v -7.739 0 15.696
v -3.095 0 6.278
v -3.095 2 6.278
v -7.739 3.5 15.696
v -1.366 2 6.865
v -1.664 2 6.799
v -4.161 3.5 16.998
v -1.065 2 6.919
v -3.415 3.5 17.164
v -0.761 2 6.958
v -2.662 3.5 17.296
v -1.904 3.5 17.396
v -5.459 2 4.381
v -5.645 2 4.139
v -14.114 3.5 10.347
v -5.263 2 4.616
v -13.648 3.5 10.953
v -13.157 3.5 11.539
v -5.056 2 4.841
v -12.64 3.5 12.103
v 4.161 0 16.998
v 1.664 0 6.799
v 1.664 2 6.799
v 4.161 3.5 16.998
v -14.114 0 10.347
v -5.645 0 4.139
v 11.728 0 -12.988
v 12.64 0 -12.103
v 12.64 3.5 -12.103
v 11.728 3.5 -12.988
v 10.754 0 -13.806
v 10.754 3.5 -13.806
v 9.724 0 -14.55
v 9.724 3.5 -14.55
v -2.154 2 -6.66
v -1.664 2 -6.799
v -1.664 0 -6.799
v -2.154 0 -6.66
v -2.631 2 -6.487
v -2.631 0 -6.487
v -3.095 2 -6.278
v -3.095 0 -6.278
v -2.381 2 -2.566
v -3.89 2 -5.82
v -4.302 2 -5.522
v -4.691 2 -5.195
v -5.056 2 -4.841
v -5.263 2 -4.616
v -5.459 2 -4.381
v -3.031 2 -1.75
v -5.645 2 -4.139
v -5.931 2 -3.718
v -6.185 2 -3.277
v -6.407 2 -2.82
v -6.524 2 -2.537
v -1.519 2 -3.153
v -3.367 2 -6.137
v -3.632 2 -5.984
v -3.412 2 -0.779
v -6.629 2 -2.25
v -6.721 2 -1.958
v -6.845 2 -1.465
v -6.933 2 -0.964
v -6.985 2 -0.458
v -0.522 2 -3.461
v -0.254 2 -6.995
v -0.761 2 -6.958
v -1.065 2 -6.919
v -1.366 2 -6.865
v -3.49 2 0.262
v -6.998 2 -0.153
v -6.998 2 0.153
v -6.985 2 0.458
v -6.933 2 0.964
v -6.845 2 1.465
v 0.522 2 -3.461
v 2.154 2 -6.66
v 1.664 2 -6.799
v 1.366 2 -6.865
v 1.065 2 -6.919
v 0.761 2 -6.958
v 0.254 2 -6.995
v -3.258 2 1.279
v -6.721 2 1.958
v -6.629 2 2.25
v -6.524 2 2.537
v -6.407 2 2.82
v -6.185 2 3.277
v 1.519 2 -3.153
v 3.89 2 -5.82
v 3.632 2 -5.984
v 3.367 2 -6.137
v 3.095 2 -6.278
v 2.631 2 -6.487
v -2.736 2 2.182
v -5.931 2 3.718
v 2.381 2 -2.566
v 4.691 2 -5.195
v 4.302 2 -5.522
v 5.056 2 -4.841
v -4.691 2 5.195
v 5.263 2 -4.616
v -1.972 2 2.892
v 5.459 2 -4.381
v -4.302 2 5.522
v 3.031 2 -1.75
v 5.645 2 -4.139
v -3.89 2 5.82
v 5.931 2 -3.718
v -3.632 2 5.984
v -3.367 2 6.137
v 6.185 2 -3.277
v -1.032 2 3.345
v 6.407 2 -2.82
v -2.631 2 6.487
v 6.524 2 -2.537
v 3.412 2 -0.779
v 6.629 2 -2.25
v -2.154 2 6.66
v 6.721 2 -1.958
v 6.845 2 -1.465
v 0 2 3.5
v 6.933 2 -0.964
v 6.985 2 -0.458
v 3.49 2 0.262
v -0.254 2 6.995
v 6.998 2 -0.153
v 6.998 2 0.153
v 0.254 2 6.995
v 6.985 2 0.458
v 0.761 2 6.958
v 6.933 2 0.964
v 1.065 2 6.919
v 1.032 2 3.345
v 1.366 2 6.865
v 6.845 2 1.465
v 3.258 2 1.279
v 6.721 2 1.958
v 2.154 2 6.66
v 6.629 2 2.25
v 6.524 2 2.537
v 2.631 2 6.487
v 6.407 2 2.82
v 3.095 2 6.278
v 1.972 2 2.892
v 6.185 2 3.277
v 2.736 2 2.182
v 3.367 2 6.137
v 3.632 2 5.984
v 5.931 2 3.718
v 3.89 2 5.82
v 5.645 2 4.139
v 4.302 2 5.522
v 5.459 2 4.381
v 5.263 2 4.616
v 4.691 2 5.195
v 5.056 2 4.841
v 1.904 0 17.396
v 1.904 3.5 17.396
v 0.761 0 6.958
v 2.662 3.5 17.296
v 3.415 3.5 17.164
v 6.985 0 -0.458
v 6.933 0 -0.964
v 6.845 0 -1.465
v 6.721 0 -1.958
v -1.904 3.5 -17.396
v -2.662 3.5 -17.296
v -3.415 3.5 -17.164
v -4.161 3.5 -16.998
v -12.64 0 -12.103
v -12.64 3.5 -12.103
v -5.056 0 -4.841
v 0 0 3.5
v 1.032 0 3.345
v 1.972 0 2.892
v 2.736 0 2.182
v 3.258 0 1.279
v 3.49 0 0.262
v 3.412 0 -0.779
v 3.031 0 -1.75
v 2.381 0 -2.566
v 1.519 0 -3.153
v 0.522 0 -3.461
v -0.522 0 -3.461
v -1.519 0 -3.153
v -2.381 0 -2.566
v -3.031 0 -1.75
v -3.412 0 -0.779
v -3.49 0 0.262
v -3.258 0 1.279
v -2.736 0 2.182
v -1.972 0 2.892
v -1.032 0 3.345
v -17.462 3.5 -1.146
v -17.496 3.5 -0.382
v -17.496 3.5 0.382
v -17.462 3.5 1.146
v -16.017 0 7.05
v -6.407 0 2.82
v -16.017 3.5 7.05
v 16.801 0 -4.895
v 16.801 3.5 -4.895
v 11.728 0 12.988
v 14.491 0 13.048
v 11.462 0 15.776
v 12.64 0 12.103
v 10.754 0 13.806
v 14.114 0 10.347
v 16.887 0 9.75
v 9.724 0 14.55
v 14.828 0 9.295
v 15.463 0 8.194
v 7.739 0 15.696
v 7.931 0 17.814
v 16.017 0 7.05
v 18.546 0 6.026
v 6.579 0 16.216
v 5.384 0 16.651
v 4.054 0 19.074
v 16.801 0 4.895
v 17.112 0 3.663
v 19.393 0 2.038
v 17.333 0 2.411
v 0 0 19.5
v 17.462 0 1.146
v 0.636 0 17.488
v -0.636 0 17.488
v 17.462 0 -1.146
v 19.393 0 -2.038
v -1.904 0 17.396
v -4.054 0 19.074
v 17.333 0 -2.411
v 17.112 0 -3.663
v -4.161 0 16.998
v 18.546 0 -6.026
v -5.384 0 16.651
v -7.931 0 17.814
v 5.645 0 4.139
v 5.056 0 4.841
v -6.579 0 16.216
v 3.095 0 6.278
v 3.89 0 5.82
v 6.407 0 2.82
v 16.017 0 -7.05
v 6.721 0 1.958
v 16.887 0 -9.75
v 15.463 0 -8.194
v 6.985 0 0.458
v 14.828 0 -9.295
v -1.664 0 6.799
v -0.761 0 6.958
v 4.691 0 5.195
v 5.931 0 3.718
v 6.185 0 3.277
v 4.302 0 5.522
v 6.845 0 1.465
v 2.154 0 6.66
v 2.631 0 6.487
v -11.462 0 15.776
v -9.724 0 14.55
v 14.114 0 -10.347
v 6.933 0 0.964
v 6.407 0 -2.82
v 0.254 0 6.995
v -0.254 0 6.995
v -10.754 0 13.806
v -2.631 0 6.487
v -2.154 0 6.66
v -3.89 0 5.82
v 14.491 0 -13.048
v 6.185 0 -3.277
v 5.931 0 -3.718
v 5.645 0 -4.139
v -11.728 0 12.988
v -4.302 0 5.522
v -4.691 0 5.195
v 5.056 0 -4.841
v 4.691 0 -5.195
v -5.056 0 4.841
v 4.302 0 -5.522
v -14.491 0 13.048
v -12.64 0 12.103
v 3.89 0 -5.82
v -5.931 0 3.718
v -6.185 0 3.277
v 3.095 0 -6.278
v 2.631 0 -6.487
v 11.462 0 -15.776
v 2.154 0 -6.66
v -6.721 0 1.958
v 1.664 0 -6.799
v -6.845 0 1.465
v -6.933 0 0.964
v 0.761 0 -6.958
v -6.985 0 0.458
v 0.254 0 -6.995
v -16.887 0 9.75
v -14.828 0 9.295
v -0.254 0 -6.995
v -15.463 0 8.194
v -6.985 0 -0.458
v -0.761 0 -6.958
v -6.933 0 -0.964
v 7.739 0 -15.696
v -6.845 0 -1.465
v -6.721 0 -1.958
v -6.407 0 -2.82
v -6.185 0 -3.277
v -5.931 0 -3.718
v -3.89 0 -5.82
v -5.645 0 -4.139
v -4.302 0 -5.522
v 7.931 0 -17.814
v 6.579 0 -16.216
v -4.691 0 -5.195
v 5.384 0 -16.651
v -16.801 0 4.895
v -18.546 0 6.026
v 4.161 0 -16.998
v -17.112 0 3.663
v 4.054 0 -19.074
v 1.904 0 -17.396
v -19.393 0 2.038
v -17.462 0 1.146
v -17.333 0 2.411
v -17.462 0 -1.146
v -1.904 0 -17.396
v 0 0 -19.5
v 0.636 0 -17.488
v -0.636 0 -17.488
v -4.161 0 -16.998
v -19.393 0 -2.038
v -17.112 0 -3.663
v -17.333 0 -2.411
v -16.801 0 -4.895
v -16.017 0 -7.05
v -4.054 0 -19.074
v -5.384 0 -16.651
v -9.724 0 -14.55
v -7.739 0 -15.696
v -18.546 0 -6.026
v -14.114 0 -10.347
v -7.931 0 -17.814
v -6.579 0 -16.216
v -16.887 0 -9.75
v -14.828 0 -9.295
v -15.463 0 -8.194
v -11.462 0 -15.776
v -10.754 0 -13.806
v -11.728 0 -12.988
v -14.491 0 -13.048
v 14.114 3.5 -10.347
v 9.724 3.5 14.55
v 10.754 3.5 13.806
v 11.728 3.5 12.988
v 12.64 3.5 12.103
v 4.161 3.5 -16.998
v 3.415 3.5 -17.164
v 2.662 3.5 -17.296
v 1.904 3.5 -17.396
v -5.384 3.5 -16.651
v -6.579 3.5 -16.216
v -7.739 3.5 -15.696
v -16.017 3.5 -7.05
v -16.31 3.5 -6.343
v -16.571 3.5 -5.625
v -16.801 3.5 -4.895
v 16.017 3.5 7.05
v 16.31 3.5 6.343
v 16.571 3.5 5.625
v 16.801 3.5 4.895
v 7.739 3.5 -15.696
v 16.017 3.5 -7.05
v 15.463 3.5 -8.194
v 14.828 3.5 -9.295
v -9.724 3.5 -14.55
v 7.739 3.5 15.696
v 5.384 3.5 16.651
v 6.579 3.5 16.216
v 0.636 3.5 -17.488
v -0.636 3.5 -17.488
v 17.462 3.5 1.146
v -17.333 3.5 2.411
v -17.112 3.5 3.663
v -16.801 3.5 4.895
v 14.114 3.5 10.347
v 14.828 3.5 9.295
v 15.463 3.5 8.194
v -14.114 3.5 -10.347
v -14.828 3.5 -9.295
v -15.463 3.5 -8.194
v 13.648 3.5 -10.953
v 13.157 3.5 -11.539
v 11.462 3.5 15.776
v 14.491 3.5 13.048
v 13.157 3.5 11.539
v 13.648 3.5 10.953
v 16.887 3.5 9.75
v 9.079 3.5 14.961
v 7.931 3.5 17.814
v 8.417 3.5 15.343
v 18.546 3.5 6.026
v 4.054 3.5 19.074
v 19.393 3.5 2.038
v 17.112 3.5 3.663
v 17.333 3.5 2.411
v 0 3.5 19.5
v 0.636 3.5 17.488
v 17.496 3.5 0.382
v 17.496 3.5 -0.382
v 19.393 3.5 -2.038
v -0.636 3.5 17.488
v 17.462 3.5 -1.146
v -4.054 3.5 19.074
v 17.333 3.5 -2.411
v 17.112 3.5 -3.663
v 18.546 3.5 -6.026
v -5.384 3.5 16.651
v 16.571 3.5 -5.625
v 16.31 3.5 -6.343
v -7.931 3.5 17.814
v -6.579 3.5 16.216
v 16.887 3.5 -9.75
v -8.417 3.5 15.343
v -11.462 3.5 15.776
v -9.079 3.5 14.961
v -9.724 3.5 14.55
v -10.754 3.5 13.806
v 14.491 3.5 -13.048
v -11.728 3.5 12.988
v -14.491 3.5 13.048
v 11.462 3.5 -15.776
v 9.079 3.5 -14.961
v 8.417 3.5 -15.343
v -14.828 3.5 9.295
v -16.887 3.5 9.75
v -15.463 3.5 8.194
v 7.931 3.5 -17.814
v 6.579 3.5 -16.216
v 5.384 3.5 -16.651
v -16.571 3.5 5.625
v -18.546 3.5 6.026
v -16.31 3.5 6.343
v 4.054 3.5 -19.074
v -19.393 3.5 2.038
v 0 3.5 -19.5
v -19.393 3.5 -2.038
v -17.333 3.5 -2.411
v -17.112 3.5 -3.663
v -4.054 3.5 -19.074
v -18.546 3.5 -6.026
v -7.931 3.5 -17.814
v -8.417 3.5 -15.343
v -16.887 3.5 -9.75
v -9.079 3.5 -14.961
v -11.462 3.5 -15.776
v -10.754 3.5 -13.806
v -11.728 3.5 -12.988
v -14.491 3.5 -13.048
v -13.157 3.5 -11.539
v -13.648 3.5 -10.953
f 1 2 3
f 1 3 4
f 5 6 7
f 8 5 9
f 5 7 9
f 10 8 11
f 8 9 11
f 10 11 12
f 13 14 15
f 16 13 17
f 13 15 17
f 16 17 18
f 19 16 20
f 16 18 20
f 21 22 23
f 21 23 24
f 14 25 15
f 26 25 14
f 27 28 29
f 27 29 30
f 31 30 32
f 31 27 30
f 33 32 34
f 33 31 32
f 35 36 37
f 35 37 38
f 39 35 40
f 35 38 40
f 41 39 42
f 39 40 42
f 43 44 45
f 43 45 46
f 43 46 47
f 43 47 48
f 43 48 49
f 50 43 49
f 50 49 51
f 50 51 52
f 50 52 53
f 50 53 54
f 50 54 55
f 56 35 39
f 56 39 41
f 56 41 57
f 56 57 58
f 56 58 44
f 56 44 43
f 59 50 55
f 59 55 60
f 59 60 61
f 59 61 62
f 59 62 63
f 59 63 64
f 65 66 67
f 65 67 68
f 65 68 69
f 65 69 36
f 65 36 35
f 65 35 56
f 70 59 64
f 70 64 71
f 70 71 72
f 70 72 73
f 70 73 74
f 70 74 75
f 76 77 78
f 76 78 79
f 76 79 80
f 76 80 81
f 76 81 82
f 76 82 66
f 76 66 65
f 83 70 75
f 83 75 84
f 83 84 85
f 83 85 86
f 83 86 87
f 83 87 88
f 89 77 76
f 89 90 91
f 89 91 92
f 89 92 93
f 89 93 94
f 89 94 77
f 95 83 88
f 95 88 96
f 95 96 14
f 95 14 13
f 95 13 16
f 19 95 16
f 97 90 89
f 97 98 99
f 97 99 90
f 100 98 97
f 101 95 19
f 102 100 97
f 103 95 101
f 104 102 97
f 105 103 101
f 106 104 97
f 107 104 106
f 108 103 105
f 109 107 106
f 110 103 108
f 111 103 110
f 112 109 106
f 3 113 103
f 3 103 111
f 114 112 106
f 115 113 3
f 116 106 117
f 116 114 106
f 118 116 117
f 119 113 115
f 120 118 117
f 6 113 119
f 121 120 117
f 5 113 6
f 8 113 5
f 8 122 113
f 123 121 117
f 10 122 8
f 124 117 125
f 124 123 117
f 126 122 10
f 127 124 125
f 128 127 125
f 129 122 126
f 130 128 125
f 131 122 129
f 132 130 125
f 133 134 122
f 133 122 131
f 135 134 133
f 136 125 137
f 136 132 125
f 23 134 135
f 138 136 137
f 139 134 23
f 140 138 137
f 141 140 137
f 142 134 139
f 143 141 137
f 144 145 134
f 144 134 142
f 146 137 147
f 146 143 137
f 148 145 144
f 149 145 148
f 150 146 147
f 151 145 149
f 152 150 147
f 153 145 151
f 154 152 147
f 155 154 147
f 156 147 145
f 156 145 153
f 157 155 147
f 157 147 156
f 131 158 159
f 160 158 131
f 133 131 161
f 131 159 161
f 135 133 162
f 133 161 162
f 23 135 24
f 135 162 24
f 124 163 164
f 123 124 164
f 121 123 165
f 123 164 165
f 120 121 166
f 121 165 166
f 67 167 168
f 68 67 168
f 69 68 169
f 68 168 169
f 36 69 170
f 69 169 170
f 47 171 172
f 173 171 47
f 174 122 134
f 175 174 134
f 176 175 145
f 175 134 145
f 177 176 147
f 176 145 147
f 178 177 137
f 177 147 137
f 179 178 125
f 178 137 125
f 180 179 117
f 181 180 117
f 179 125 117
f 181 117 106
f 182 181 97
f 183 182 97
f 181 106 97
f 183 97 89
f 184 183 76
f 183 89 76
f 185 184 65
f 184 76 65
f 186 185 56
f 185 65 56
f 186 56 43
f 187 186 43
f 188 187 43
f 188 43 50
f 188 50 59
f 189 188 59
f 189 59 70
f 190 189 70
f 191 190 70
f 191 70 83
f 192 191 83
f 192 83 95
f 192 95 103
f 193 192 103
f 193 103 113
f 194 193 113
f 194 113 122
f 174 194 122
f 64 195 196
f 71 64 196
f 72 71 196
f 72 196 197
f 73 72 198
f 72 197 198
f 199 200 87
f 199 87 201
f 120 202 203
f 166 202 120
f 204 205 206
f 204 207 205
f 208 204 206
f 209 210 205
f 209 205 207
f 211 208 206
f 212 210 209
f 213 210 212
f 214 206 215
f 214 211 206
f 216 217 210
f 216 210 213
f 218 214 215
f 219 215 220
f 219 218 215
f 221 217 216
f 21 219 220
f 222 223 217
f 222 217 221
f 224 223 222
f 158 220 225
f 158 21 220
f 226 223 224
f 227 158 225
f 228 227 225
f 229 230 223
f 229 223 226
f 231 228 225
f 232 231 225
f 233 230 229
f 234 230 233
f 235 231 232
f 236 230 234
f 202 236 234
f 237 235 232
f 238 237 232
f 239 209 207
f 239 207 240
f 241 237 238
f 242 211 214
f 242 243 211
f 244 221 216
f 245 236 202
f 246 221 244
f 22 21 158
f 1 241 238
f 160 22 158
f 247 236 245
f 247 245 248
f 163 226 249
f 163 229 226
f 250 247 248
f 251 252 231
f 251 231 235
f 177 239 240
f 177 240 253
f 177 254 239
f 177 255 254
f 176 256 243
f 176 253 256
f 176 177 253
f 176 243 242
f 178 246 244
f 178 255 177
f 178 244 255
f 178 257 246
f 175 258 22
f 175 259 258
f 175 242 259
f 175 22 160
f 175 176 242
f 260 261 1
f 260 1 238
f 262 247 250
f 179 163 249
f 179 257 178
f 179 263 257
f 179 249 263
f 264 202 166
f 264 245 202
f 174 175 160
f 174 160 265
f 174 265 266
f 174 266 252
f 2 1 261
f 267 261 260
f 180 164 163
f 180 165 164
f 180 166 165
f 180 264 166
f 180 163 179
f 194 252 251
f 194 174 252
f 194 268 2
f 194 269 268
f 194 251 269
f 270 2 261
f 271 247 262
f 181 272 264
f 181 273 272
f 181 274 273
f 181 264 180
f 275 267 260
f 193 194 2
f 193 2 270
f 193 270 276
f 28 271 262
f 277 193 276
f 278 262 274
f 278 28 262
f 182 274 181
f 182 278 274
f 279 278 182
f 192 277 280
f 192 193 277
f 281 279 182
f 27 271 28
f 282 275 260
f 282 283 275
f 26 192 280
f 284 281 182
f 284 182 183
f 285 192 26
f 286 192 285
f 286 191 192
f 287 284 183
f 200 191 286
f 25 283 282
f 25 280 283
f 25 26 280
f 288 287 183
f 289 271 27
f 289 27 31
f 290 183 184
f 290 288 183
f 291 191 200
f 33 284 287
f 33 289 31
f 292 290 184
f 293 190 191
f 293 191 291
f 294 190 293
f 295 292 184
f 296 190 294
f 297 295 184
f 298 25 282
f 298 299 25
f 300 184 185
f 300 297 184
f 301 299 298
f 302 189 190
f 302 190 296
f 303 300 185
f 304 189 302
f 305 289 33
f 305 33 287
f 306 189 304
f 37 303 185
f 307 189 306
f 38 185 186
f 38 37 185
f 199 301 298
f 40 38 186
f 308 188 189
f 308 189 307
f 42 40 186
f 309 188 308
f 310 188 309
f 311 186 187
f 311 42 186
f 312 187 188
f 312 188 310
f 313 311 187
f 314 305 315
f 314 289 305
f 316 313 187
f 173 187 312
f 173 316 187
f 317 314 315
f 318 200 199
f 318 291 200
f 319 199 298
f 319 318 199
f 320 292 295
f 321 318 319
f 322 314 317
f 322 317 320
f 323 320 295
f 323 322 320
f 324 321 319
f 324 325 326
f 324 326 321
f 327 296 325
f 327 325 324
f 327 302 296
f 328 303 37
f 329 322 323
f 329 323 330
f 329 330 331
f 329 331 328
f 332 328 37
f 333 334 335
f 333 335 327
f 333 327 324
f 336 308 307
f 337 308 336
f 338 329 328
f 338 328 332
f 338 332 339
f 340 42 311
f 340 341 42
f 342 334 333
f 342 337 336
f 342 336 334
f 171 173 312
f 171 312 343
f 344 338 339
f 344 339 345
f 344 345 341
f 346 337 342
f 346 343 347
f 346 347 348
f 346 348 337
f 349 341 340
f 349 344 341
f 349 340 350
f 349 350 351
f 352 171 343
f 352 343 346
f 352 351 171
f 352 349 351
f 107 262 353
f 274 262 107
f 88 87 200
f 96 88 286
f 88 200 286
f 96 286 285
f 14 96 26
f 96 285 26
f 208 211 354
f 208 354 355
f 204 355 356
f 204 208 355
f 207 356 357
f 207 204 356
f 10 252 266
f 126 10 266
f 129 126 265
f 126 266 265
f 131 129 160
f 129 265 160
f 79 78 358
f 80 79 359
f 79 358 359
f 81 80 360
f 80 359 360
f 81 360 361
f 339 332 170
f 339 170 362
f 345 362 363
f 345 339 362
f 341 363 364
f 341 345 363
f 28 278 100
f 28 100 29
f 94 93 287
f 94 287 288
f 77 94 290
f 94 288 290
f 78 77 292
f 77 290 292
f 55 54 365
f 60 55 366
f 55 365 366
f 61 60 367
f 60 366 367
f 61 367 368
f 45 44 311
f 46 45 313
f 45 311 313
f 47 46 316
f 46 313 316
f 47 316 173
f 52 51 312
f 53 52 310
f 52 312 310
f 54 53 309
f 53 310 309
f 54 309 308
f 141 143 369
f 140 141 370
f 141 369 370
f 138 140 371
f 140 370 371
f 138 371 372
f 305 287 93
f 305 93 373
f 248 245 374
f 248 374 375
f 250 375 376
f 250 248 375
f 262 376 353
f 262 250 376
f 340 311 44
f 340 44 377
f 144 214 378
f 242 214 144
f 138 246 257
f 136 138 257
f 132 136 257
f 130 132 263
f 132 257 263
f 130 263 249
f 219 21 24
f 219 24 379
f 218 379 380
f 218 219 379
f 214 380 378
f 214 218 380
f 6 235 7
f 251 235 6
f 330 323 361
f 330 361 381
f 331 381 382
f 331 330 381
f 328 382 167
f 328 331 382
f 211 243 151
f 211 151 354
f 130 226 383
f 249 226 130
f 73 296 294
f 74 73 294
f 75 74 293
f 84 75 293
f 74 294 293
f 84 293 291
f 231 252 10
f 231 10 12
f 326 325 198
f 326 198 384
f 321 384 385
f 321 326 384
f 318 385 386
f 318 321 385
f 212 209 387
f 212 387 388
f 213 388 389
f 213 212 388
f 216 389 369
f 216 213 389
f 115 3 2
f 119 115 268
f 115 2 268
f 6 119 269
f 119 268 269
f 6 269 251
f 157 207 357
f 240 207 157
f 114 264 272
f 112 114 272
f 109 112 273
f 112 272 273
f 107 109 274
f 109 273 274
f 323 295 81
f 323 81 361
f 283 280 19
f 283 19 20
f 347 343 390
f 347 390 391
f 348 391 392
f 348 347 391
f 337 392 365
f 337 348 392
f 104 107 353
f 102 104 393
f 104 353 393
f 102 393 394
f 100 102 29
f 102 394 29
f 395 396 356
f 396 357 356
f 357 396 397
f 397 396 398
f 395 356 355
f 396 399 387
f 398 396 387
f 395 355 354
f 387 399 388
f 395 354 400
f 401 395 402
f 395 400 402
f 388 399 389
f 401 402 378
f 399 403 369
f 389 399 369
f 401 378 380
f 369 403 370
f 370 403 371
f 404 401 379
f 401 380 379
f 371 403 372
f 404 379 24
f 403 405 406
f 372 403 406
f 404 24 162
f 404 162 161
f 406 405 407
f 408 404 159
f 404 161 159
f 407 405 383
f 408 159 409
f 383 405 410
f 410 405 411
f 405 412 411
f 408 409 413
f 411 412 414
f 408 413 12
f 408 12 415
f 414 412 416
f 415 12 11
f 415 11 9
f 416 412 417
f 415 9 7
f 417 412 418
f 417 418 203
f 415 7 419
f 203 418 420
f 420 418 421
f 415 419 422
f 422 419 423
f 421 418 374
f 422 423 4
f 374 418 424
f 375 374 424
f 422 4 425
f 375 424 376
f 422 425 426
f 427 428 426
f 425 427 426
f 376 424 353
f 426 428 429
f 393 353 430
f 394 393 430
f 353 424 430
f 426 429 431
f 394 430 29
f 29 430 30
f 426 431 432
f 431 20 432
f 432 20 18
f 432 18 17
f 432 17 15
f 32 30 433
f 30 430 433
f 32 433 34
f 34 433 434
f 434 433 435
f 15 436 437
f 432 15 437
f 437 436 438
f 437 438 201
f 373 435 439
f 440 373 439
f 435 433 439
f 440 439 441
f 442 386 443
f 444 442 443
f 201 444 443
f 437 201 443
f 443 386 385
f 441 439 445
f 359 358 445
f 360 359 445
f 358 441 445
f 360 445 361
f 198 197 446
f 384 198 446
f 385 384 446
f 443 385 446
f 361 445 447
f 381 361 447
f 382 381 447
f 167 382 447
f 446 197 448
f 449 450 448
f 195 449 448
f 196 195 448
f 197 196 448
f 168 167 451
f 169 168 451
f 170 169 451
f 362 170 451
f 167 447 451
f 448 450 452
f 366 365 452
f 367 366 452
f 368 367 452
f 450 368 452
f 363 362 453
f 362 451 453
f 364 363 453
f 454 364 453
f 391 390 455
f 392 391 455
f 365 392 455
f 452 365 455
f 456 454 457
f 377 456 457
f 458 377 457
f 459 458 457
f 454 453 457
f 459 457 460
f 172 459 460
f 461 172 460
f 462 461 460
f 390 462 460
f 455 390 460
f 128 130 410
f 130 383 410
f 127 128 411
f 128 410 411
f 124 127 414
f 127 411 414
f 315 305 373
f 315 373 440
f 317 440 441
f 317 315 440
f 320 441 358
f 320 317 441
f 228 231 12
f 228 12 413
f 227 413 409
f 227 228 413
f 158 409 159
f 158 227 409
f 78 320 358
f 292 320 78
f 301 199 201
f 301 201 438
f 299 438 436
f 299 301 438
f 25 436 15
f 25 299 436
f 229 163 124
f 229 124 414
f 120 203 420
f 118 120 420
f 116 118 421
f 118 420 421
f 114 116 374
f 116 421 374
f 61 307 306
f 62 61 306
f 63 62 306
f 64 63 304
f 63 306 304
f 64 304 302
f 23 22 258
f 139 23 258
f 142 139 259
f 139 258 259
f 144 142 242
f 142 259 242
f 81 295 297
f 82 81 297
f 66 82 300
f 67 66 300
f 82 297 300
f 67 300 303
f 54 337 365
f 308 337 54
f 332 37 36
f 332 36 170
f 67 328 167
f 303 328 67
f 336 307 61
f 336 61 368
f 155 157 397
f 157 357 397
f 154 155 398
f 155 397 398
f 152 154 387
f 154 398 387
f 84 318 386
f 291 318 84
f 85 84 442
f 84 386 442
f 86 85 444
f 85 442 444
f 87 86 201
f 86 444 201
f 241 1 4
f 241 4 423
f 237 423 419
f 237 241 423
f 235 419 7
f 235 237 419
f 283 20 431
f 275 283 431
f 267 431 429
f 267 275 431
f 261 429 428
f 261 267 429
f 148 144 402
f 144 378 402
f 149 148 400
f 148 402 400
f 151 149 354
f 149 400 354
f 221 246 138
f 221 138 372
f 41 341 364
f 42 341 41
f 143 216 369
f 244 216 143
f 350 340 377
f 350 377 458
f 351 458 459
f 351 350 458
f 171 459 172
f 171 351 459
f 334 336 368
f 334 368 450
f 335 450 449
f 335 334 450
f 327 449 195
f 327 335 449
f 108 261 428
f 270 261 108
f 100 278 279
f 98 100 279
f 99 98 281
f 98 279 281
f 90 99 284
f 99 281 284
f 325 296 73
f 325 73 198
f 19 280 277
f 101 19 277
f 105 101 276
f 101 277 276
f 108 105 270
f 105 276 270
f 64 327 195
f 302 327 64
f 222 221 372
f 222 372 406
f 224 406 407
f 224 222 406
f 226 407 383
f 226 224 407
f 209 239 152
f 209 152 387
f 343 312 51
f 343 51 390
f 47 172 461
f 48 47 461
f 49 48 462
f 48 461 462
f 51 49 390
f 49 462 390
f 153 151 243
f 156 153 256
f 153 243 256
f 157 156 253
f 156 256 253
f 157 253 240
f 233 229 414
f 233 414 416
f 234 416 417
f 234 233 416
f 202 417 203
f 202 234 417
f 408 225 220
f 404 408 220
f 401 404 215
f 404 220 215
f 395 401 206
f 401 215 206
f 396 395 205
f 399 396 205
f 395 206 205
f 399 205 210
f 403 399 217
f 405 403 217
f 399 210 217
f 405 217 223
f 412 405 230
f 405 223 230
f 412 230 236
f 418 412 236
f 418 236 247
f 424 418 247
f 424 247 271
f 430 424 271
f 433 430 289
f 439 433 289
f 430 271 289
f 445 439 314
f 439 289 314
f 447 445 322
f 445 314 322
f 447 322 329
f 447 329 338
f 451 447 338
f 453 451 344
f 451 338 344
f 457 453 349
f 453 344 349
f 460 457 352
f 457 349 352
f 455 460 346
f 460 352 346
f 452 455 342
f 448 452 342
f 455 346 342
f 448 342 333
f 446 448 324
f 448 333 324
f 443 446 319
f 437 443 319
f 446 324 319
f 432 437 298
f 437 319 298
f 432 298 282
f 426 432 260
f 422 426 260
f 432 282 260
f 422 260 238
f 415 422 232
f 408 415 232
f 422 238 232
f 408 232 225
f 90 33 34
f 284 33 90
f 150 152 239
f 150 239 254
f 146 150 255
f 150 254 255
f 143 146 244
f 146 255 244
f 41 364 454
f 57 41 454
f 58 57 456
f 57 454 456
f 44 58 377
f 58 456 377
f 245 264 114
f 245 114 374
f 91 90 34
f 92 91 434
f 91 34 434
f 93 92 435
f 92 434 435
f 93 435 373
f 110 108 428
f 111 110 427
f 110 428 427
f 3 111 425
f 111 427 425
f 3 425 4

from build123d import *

# Parameters (mm, degrees)
SKETCH1_R           = 19.5
SKETCH1_R_2         = 17.5
BOSS_EXTRUDE1_DEPTH = 3.5
SKETCH2_R           = 7
BOSS_EXTRUDE2_DEPTH = 2
BOSS_EXTRUDE3_DEPTH = 3.5
SKETCH8_R           = 3.5
CUT_EXTRUDE1_DEPTH  = 28.649593125


with BuildPart() as part:
    # Sketch1 → Boss-Extrude1 (new body)
    with BuildSketch(Plane(origin=(0, 0, 0), x_dir=(1, 0, 0), z_dir=(0, 1, 0))):
        with Locations(Location((0, 0, 0), (0, 0, 270))):
            Circle(SKETCH1_R)
        with Locations(Location((0, 0, 0), (0, 0, 270))):
            Circle(SKETCH1_R_2, mode=Mode.SUBTRACT)
    extrude(amount=BOSS_EXTRUDE1_DEPTH)



with BuildPart() as body_2:
    # Sketch2 → Boss-Extrude2 (new body)
    with BuildSketch(Plane(origin=(0, 0, 0), x_dir=(1, 0, 0), z_dir=(0, 1, 0))):
        with Locations(Location((0, 0, 0), (0, 0, 270))):
            Circle(SKETCH2_R)
    extrude(amount=BOSS_EXTRUDE2_DEPTH)


with BuildPart() as part_1:
    add(part.part)

    add(body_2.part)  # Boss-Extrude3 merges body 2
    # Sketch4 → Boss-Extrude3 (add)
    with BuildSketch(Plane(origin=(0, 0, 0), x_dir=(1, 0, 0), z_dir=(0, 1, 0))):
        with BuildLine():
            Line((0.76143589, 6.958463579), (1.903589725, 17.396158948))
            ThreePointArc((1.903589725, 17.396158948), (3.038843109, 17.234135678), (4.161047559, 16.998108224))
            Line((4.161047559, 16.998108224), (1.664419024, 6.79924329))
            ThreePointArc((1.664419024, 6.79924329), (1.215537244, 6.893654271), (0.76143589, 6.958463579))
        make_face()
        with BuildLine():
            Line((3.095450398, 6.278390465), (7.738625995, 15.695976163))
            ThreePointArc((7.738625995, 15.695976163), (8.75, 15.155444566), (9.723801097, 14.549834783))
            Line((9.723801097, 14.549834783), (3.889520439, 5.819933913))
            ThreePointArc((3.889520439, 5.819933913), (3.5, 6.062177826), (3.095450398, 6.278390465))
        make_face()
        with BuildLine():
            Line((5.056107904, 4.841050802), (12.640269759, 12.102627005))
            ThreePointArc((12.640269759, 12.102627005), (13.405777755, 11.24878317), (14.113720715, 10.346636535))
            Line((14.113720715, 10.346636535), (5.645488286, 4.138654614))
            ThreePointArc((5.645488286, 4.138654614), (5.362311102, 4.499513268), (5.056107904, 4.841050802))
        make_face()
        with BuildLine():
            Line((6.406924176, 2.819808966), (16.01731044, 7.049522414))
            ThreePointArc((16.01731044, 7.049522414), (16.444620864, 5.985352508), (16.801317318, 4.89548122))
            Line((16.801317318, 4.89548122), (6.720526927, 1.958192488))
            ThreePointArc((6.720526927, 1.958192488), (6.577848346, 2.394141003), (6.406924176, 2.819808966))
        make_face()
        with BuildLine():
            Line((6.984970837, 0.458456552), (17.462427092, 1.14614138))
            ThreePointArc((17.462427092, 1.14614138), (17.5, 0), (17.462427092, -1.14614138))
            Line((17.462427092, -1.14614138), (6.984970837, -0.458456552))
            ThreePointArc((6.984970837, -0.458456552), (7, 0), (6.984970837, 0.458456552))
        make_face()
        with BuildLine():
            Line((6.720526927, -1.958192488), (16.801317318, -4.89548122))
            ThreePointArc((16.801317318, -4.89548122), (16.444620864, -5.985352508), (16.01731044, -7.049522414))
            Line((16.01731044, -7.049522414), (6.406924176, -2.819808966))
            ThreePointArc((6.406924176, -2.819808966), (6.577848346, -2.394141003), (6.720526927, -1.958192488))
        make_face()
        with BuildLine():
            Line((5.645488286, -4.138654614), (14.113720715, -10.346636535))
            ThreePointArc((14.113720715, -10.346636535), (13.405777755, -11.24878317), (12.640269759, -12.102627005))
            Line((12.640269759, -12.102627005), (5.056107904, -4.841050802))
            ThreePointArc((5.056107904, -4.841050802), (5.362311102, -4.499513268), (5.645488286, -4.138654614))
        make_face()
        with BuildLine():
            Line((3.889520439, -5.819933913), (9.723801097, -14.549834783))
            ThreePointArc((9.723801097, -14.549834783), (8.75, -15.155444566), (7.738625995, -15.695976163))
            Line((7.738625995, -15.695976163), (3.095450398, -6.278390465))
            ThreePointArc((3.095450398, -6.278390465), (3.5, -6.062177826), (3.889520439, -5.819933913))
        make_face()
        with BuildLine():
            Line((1.664419024, -6.79924329), (4.161047559, -16.998108224))
            ThreePointArc((4.161047559, -16.998108224), (3.038843109, -17.234135678), (1.903589725, -17.396158948))
            Line((1.903589725, -17.396158948), (0.76143589, -6.958463579))
            ThreePointArc((0.76143589, -6.958463579), (1.215537244, -6.893654271), (1.664419024, -6.79924329))
        make_face()
        with BuildLine():
            Line((-0.76143589, -6.958463579), (-1.903589725, -17.396158948))
            ThreePointArc((-1.903589725, -17.396158948), (-3.038843109, -17.234135678), (-4.161047559, -16.998108224))
            Line((-4.161047559, -16.998108224), (-1.664419024, -6.79924329))
            ThreePointArc((-1.664419024, -6.79924329), (-1.215537244, -6.893654271), (-0.76143589, -6.958463579))
        make_face()
        with BuildLine():
            Line((-3.095450398, -6.278390465), (-7.738625995, -15.695976163))
            ThreePointArc((-7.738625995, -15.695976163), (-8.75, -15.155444566), (-9.723801097, -14.549834783))
            Line((-9.723801097, -14.549834783), (-3.889520439, -5.819933913))
            ThreePointArc((-3.889520439, -5.819933913), (-3.5, -6.062177826), (-3.095450398, -6.278390465))
        make_face()
        with BuildLine():
            Line((-5.056107904, -4.841050802), (-12.640269759, -12.102627005))
            ThreePointArc((-12.640269759, -12.102627005), (-13.405777755, -11.24878317), (-14.113720715, -10.346636535))
            Line((-14.113720715, -10.346636535), (-5.645488286, -4.138654614))
            ThreePointArc((-5.645488286, -4.138654614), (-5.362311102, -4.499513268), (-5.056107904, -4.841050802))
        make_face()
        with BuildLine():
            Line((-6.406924176, -2.819808966), (-16.01731044, -7.049522414))
            ThreePointArc((-16.01731044, -7.049522414), (-16.444620864, -5.985352508), (-16.801317318, -4.89548122))
            Line((-16.801317318, -4.89548122), (-6.720526927, -1.958192488))
            ThreePointArc((-6.720526927, -1.958192488), (-6.577848346, -2.394141003), (-6.406924176, -2.819808966))
        make_face()
        with BuildLine():
            Line((-6.984970837, -0.458456552), (-17.462427092, -1.14614138))
            ThreePointArc((-17.462427092, -1.14614138), (-17.5, 0), (-17.462427092, 1.14614138))
            Line((-17.462427092, 1.14614138), (-6.984970837, 0.458456552))
            ThreePointArc((-6.984970837, 0.458456552), (-7, 0), (-6.984970837, -0.458456552))
        make_face()
        with BuildLine():
            Line((-6.720526927, 1.958192488), (-16.801317318, 4.89548122))
            ThreePointArc((-16.801317318, 4.89548122), (-16.444620864, 5.985352508), (-16.01731044, 7.049522414))
            Line((-16.01731044, 7.049522414), (-6.406924176, 2.819808966))
            ThreePointArc((-6.406924176, 2.819808966), (-6.577848346, 2.394141003), (-6.720526927, 1.958192488))
        make_face()
        with BuildLine():
            Line((-5.645488286, 4.138654614), (-14.113720715, 10.346636535))
            ThreePointArc((-14.113720715, 10.346636535), (-13.405777755, 11.24878317), (-12.640269759, 12.102627005))
            Line((-12.640269759, 12.102627005), (-5.056107904, 4.841050802))
            ThreePointArc((-5.056107904, 4.841050802), (-5.362311102, 4.499513268), (-5.645488286, 4.138654614))
        make_face()
        with BuildLine():
            Line((-3.889520439, 5.819933913), (-9.723801097, 14.549834783))
            ThreePointArc((-9.723801097, 14.549834783), (-8.75, 15.155444566), (-7.738625995, 15.695976163))
            Line((-7.738625995, 15.695976163), (-3.095450398, 6.278390465))
            ThreePointArc((-3.095450398, 6.278390465), (-3.5, 6.062177826), (-3.889520439, 5.819933913))
        make_face()
        with BuildLine():
            Line((-1.664419024, 6.79924329), (-4.161047559, 16.998108224))
            ThreePointArc((-4.161047559, 16.998108224), (-3.038843109, 17.234135678), (-1.903589725, 17.396158948))
            Line((-1.903589725, 17.396158948), (-0.76143589, 6.958463579))
            ThreePointArc((-0.76143589, 6.958463579), (-1.215537244, 6.893654271), (-1.664419024, 6.79924329))
        make_face()
    extrude(amount=BOSS_EXTRUDE3_DEPTH)

    # Sketch7 → Cut-Revolve1 (revolve, cut)
    with BuildSketch(Plane.XY):
        Polygon((7, 2), (17.5, 3.5), (7, 3.5), align=None)
    revolve(axis=Axis((0, -983.4456259, 0), (0, 1, 0)), mode=Mode.SUBTRACT)

    # Sketch8 → Cut-Extrude1 (cut, through all)
    with BuildSketch(Plane(origin=(0, 2, 0), x_dir=(1, 0, 0), z_dir=(0, 1, 0))):
        with Locations(Location((0, 0, 0), (0, 0, 270))):
            Circle(SKETCH8_R)
    extrude(amount=-CUT_EXTRUDE1_DEPTH, mode=Mode.SUBTRACT)


solid = part_1.part
